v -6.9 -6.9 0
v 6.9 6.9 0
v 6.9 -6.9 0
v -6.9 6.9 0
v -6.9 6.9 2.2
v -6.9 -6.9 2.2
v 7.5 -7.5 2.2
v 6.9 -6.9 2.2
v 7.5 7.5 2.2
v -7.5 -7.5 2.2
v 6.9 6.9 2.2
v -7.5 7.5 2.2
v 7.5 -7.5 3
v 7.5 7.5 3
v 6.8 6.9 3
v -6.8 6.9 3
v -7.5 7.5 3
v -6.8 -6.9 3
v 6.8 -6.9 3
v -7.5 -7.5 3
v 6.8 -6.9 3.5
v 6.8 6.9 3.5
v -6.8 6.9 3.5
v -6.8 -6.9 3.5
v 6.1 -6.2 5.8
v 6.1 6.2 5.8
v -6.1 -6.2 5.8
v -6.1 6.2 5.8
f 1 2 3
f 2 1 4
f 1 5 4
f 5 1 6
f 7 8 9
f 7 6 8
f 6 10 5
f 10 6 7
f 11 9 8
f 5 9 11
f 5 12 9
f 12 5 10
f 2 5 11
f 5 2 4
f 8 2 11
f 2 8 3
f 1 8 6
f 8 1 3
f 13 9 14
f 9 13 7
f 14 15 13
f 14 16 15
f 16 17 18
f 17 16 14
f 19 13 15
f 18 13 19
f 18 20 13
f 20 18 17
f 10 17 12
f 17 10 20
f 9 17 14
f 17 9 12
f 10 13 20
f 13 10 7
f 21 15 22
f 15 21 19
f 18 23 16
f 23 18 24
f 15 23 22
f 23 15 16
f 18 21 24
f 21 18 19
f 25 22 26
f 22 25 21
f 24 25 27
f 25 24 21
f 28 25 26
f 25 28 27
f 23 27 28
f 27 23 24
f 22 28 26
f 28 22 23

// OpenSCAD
LPChocV1();

 module LPChocV1(){
    sf_min_d = 12.4;
    sf_min_w = 12.2;
    sf_max_d = 13.8;
    sf_max_w = 13.6;
    sf_step_h = 0.5;
    sf_h = 1.5;
    sm_d = 15;
    sm_w = 15;
    sm_h = 0.8;
    sr_d = 13.8;
    sr_w = 13.8;
    sr_h = 2.2;
     
    linear_extrude(sr_h) square([sr_w, sr_d], center=true);
    translate([-sm_w*0.5, -sm_d*0.5, sr_h]) cube([sm_w, sm_d, sm_h]);
    translate([-sf_max_w*0.5, -sf_max_d*0.5, sr_h+sm_h]) cube([sf_max_w, sf_max_d, sf_step_h]);
    translate([-sf_max_w*0.5, -sf_max_d*0.5, sr_h+sm_h+sf_step_h])
     polyhedron(
        points=[
        [0, 0, 0],
        [sf_max_w, 0, 0],  
        [sf_max_w, sf_max_d, 0], 
        [0, sf_max_d, 0],
     
        [(sf_max_w-sf_min_w)*0.5, (sf_max_d-sf_min_d)*0.5, sf_h+sm_h], 
        [(sf_max_w-sf_min_w)*0.5, ((sf_max_d-sf_min_d)*0.5)+sf_min_d, sf_h+sm_h], 
        [((sf_max_w-sf_min_w)*0.5)+sf_min_w, ((sf_max_d-sf_min_d)*0.5)+sf_min_d, sf_h+sm_h], 
        [((sf_max_w-sf_min_w)*0.5)+sf_min_w, ((sf_max_d-sf_min_d)*0.5), sf_h+sm_h]],
        faces=[
        [0,1,2,3],
        [4,5,6,7],
        [0,4,7,1],
        [3,5,4,0],
        [2,6,5,3],
        [1,7,6,2]]
    );
}
 
